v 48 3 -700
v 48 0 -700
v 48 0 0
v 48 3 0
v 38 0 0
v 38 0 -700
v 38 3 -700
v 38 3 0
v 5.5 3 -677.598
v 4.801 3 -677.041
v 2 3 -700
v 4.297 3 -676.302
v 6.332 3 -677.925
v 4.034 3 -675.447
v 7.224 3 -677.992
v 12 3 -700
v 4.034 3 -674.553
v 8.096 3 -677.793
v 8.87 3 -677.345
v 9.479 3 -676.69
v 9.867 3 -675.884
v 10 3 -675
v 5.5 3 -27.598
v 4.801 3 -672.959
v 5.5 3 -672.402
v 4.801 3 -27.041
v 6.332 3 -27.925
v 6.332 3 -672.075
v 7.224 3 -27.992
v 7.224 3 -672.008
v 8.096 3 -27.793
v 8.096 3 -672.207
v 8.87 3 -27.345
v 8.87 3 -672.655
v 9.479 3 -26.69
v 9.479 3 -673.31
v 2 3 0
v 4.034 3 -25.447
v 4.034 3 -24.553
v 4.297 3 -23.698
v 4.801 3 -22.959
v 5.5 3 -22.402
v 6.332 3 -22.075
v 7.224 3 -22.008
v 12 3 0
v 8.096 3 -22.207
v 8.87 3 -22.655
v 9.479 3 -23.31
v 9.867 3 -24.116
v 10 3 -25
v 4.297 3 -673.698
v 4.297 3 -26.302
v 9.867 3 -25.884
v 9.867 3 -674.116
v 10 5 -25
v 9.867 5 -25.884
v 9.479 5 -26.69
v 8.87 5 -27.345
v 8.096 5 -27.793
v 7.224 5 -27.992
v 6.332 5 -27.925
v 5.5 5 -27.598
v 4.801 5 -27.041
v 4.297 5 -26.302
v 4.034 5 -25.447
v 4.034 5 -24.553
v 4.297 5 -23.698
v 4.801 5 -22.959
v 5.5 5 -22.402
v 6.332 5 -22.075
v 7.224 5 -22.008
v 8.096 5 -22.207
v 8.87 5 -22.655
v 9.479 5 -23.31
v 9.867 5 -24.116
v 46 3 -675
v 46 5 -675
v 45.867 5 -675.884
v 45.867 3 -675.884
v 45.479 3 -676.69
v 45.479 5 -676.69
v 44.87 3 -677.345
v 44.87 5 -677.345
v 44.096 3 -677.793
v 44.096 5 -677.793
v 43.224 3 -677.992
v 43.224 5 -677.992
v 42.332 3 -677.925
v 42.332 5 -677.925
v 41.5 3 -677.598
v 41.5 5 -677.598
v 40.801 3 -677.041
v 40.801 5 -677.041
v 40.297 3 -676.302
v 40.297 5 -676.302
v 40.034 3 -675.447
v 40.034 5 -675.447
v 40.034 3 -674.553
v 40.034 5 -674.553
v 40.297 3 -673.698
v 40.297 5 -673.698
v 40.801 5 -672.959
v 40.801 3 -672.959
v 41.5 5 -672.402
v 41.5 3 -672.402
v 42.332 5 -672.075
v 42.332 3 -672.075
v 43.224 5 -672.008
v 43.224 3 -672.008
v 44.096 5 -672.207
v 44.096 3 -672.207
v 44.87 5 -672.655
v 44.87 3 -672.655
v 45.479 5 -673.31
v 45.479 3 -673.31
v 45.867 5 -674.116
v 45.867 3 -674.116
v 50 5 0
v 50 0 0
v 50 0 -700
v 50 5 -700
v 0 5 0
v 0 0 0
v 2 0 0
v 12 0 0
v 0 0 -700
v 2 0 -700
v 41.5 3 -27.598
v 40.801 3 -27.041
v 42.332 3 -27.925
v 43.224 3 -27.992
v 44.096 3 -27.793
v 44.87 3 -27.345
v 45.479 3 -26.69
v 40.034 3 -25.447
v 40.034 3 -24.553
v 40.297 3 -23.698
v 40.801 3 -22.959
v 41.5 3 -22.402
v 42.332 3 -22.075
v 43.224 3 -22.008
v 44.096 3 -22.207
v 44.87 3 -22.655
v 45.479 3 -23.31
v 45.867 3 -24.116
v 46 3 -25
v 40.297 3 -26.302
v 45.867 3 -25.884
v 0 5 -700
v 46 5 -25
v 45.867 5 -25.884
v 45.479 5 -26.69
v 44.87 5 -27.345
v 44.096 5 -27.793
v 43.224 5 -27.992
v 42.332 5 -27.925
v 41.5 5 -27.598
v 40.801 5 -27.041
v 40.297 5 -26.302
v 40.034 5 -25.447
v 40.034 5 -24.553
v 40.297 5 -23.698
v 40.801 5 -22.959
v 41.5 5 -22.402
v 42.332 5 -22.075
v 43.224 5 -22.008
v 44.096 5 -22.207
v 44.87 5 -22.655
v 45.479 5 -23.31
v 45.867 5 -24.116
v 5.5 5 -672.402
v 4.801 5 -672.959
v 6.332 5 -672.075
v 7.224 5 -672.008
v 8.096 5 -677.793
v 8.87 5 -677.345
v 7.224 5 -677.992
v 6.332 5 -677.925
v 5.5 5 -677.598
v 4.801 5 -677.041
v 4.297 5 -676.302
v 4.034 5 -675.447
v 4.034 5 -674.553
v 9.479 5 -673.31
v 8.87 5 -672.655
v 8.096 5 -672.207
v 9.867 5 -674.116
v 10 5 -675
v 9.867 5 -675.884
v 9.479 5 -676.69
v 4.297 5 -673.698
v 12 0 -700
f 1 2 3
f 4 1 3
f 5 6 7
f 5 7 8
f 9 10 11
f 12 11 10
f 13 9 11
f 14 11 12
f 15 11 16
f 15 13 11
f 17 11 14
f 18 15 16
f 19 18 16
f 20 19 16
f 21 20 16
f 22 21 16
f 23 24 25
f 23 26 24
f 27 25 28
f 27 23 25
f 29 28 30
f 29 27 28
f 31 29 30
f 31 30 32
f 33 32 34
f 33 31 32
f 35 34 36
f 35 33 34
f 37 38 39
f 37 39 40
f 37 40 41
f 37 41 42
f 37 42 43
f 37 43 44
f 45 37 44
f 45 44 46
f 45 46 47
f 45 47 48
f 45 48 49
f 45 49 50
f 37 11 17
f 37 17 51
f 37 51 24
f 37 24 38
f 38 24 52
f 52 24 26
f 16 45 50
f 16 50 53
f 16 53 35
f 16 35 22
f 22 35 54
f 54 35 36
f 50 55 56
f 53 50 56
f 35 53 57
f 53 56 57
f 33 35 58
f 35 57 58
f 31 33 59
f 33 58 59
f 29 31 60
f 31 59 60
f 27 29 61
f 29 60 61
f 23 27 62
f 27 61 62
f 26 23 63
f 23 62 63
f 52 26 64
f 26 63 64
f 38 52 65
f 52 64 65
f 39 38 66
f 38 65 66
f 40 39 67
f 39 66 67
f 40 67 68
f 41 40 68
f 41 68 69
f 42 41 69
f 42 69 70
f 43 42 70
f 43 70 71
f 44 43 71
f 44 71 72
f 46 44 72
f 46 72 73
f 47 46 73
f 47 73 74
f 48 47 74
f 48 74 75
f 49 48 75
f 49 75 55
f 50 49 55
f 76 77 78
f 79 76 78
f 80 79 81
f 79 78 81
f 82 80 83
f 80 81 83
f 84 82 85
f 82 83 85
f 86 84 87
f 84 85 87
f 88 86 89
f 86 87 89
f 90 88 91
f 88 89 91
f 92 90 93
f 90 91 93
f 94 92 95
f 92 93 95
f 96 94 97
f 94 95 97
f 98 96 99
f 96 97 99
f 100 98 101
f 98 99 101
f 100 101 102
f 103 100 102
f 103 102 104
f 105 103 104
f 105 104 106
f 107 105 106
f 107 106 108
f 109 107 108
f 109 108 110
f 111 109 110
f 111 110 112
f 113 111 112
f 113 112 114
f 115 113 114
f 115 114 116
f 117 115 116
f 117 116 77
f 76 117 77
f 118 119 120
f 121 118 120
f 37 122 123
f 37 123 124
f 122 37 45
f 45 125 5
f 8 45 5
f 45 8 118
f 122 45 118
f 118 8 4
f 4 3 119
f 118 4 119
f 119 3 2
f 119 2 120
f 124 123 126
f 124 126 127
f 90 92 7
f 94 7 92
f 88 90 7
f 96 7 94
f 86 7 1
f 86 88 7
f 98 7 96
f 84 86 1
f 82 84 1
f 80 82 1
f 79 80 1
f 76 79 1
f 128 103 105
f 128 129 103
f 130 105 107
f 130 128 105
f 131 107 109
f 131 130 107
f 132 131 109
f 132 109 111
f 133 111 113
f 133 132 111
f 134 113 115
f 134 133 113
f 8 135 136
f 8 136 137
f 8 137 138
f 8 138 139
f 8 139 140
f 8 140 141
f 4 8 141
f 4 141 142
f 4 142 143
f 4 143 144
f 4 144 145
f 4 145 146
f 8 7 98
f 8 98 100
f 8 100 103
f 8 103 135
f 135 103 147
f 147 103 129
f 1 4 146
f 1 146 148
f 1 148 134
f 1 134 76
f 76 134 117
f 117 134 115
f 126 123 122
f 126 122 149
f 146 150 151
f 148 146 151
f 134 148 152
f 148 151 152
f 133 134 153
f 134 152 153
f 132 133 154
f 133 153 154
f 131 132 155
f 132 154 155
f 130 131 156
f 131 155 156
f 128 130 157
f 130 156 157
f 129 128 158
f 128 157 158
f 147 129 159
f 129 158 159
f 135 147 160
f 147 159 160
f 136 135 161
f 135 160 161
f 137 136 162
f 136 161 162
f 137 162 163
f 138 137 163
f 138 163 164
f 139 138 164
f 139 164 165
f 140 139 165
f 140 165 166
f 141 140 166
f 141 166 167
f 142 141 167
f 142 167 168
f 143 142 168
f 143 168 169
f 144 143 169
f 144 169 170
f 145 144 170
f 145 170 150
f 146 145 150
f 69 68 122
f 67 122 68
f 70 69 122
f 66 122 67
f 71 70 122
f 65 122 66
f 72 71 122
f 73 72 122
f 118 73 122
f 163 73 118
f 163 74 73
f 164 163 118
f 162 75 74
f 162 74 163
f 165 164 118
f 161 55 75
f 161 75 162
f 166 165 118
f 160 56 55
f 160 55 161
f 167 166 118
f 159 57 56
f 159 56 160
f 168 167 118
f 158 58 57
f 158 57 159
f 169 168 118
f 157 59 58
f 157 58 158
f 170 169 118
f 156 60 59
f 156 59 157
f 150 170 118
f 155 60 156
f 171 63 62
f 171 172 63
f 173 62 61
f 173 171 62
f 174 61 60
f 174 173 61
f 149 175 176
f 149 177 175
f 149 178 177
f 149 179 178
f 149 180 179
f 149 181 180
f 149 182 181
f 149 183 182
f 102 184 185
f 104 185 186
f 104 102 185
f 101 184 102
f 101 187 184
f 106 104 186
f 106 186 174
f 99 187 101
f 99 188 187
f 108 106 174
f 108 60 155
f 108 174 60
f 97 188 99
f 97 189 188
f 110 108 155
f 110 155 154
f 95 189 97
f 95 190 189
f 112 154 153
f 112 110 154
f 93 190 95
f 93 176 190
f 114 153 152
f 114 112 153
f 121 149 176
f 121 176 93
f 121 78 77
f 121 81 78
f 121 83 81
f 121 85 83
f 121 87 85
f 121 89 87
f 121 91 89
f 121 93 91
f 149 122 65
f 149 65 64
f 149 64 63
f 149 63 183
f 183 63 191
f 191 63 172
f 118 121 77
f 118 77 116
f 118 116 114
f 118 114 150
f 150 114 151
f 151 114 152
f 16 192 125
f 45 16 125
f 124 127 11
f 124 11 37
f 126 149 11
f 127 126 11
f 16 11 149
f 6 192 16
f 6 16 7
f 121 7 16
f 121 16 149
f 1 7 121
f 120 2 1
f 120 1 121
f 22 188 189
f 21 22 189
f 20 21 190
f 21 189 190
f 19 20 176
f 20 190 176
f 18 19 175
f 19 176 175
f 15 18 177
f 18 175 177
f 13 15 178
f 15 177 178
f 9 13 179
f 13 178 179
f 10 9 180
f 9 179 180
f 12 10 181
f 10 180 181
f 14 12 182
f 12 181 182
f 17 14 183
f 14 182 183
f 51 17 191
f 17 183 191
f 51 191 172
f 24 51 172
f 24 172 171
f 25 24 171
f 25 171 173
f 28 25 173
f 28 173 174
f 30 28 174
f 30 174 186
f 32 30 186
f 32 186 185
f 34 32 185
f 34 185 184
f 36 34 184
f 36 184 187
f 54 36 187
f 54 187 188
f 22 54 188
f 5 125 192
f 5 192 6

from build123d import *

# Parameters (mm, degrees)
SKETCH1_W           = 50
SKETCH1_H           = 700
BOSS_EXTRUDE1_DEPTH = 5
SKETCH6_R           = 3
CUT_EXTRUDE3_DEPTH  = 6
SKETCH11_W          = 10
SKETCH11_H          = 700
CUT_EXTRUDE4_DEPTH  = 3


with BuildPart() as part:
    # Sketch1 → Boss-Extrude1 (new body)
    with BuildSketch(Plane(origin=(0, 0, 0), x_dir=(1, 0, 0), z_dir=(0, 1, 0))):
        with Locations((25, 350)):
            Rectangle(SKETCH1_W, SKETCH1_H)
    extrude(amount=BOSS_EXTRUDE1_DEPTH)

    # Sketch6 → Cut-Extrude3 (cut, through all)
    with BuildSketch(Plane(origin=(0, 5, 0), x_dir=(1, 0, 0), z_dir=(0, 1, 0))):
        with Locations((43, 25)):
            Circle(SKETCH6_R)
        with Locations((7, 25)):
            Circle(SKETCH6_R)
        with Locations((43, 675)):
            Circle(SKETCH6_R)
        with Locations((7, 675)):
            Circle(SKETCH6_R)
    extrude(amount=-CUT_EXTRUDE3_DEPTH, mode=Mode.SUBTRACT)

    # Sketch11 → Cut-Extrude4 (cut)
    with BuildSketch(Plane.XZ):
        with Locations((7, -350)):
            Rectangle(SKETCH11_W, SKETCH11_H)
        with Locations((43, -350)):
            Rectangle(SKETCH11_W, SKETCH11_H)
    extrude(amount=-CUT_EXTRUDE4_DEPTH, mode=Mode.SUBTRACT)


solid = part.part
